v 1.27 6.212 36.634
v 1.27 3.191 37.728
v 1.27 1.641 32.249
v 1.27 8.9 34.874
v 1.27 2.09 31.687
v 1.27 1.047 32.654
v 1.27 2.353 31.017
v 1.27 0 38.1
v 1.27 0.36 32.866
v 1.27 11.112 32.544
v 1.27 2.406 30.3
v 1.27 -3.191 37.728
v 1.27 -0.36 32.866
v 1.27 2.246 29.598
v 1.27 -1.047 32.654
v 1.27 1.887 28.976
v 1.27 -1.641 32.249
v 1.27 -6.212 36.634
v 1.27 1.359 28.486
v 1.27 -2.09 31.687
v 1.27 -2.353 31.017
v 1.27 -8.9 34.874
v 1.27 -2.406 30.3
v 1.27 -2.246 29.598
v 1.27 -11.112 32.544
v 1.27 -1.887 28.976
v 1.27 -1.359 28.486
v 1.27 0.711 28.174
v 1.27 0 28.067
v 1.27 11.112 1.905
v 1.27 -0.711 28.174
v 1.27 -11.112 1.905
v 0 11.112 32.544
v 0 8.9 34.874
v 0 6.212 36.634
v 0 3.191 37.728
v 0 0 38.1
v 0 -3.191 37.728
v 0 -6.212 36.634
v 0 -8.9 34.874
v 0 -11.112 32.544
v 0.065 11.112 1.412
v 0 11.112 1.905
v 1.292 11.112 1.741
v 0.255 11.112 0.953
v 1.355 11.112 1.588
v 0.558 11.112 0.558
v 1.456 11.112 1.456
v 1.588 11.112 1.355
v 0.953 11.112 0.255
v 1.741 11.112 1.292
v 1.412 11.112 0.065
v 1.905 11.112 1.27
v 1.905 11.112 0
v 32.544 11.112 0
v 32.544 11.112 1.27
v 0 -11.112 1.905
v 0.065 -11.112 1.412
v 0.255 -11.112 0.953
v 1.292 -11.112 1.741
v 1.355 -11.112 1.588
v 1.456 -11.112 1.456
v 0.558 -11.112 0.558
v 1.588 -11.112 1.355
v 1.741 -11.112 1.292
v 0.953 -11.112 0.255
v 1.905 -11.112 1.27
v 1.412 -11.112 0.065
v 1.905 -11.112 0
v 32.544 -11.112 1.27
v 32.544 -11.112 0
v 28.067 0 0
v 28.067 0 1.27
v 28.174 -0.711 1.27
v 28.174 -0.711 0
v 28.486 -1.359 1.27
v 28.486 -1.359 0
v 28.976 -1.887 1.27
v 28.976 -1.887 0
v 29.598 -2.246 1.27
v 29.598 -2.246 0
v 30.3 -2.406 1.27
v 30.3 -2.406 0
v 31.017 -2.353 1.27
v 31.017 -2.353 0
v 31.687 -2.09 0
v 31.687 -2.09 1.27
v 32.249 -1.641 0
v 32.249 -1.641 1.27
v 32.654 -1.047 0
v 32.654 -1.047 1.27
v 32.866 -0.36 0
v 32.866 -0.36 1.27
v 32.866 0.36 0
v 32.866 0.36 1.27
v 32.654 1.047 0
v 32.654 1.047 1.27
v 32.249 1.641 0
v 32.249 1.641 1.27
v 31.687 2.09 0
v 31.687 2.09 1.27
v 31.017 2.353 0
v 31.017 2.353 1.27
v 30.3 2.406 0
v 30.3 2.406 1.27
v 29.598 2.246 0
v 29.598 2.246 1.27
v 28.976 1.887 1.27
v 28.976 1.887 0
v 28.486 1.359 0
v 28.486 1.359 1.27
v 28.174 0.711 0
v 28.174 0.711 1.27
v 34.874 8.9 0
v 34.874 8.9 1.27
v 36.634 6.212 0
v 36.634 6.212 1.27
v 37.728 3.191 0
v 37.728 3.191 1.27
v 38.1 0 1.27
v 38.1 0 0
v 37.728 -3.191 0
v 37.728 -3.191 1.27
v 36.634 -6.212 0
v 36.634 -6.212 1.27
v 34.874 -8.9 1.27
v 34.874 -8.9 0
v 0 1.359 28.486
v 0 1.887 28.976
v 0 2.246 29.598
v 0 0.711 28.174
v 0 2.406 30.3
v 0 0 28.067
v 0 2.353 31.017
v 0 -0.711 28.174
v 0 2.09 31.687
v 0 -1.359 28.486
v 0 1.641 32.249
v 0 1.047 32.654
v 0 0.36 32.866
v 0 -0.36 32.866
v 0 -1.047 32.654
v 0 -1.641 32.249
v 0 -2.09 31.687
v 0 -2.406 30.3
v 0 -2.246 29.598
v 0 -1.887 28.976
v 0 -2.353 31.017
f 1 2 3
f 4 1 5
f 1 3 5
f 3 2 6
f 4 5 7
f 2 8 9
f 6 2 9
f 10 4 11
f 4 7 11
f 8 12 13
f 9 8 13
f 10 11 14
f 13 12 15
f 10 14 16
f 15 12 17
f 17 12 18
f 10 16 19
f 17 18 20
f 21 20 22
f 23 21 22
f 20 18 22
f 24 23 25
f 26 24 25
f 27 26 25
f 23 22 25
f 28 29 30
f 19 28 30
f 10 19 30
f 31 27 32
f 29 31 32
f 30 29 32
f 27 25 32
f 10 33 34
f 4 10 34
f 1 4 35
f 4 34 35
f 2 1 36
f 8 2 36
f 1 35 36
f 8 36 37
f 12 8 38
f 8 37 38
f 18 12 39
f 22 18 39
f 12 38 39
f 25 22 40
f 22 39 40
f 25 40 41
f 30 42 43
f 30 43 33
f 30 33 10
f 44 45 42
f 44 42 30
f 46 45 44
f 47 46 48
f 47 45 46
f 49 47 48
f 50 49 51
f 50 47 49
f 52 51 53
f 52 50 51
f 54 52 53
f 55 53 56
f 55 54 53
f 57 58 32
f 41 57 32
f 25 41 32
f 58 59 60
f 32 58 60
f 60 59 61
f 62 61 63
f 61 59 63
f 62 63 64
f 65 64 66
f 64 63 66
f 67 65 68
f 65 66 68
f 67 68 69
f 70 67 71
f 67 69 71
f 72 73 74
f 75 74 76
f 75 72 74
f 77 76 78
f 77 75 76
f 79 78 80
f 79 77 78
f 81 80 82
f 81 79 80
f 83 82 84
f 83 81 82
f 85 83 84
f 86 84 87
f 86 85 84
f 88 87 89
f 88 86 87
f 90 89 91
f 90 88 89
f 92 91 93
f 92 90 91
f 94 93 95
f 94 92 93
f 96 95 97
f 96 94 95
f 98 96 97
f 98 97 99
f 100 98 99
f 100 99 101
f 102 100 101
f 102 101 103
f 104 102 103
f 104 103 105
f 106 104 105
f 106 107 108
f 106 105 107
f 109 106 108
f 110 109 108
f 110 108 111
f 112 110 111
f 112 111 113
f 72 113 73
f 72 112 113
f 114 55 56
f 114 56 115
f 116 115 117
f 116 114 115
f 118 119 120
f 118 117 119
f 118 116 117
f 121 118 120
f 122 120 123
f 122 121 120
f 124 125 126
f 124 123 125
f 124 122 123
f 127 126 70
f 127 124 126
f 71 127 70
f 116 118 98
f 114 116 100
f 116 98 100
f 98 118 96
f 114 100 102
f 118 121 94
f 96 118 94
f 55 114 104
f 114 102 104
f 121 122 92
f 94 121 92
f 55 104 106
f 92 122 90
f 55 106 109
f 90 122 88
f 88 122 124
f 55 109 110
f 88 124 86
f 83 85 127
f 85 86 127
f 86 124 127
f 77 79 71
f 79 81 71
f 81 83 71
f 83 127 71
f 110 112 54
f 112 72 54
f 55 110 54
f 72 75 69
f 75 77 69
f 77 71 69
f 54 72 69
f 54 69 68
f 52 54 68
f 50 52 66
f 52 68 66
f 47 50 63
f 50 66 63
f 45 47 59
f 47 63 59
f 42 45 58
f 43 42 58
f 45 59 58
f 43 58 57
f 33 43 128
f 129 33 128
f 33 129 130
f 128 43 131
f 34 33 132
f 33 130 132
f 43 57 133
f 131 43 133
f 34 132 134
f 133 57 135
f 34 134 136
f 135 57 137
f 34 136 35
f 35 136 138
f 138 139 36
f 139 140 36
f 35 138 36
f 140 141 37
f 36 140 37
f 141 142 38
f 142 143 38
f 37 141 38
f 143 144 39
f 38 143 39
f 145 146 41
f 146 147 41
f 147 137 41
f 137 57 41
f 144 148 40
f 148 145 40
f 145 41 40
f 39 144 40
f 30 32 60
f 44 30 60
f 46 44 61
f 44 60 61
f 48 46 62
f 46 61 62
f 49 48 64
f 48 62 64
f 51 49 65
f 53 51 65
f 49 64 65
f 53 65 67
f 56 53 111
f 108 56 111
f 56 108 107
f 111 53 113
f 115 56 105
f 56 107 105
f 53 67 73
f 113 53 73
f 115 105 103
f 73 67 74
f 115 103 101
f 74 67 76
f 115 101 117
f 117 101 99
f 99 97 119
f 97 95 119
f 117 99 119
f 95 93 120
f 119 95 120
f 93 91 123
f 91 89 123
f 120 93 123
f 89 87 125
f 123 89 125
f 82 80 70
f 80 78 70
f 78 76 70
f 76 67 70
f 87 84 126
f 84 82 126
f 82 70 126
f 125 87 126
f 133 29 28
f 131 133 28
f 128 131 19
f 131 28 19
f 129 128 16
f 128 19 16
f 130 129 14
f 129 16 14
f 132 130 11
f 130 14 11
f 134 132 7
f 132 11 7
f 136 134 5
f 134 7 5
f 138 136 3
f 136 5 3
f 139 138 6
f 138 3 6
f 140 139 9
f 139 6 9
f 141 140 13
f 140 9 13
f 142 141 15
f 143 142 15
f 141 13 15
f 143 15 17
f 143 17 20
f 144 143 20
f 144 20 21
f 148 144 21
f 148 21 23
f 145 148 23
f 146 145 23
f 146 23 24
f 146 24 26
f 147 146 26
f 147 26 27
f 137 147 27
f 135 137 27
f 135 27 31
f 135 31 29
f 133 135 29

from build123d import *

# Parameters (mm, degrees)
EXTRUDE_THIN1_START     = -11.1125
EXTRUDE_THIN1_DEPTH     = 22.225
SKETCH4_R               = 2.413
EXTRUDE3_DEPTH          = 55.143758239
SKETCH6_R               = 2.413
CUT_EXTRUDE1_DEPTH      = 56.015521957
CUT_EXTRUDE2_DEPTH      = 55.143758239
CUT_EXTRUDE2_DEPTH_BACK = 55.143758239
CUT_EXTRUDE3_DEPTH      = 56.015521957
CUT_EXTRUDE3_DEPTH_BACK = 56.015521957


# Read off the part's stored shape, not the designer's step: Extrude-Thin1
with BuildPart() as part:
    # Extrude-Thin1 outline → Extrude-Thin1 (new body)
    with BuildSketch(Plane(origin=(0, 0, 0), x_dir=(1, 0, 0), z_dir=(0, 1, 0)).offset(EXTRUDE_THIN1_START)):
        with BuildLine():
            Line((1.905, -1.27), (38.1, -1.27))
            Line((38.1, -1.27), (38.1, 0))
            Line((38.1, 0), (1.905, 0))
            ThreePointArc((1.905, 0), (0.557961582, -0.557961582), (0, -1.905))
            Line((0, -1.905), (0, -38.1))
            Line((0, -38.1), (1.27, -38.1))
            Line((1.27, -38.1), (1.27, -1.905))
            ThreePointArc((1.27, -1.905), (1.455987194, -1.455987194), (1.905, -1.27))
        make_face()
    extrude(amount=EXTRUDE_THIN1_DEPTH)

    # Sketch4 → Extrude3 (cut, through all)
    with BuildSketch(Plane(origin=(1.27, 0, 0), x_dir=(0, 0, -1), z_dir=(1, 0, 0))):
        with Locations((-30.48, 0)):
            Circle(SKETCH4_R)
    extrude(amount=-EXTRUDE3_DEPTH, mode=Mode.SUBTRACT)

    # Sketch6 → Cut-Extrude1 (cut, through all)
    with BuildSketch(Plane.XY):
        with Locations(Location((30.48, 0, 0), (0, 0, 180))):
            Circle(SKETCH6_R)
    extrude(amount=CUT_EXTRUDE1_DEPTH, mode=Mode.SUBTRACT)

    # Sketch8 → Cut-Extrude2 (cut, two sides: drawn at the far end of the back side and taken through both)
    with BuildSketch(Plane(origin=(1.27, 0, 0), x_dir=(0, 0, -1), z_dir=(1, 0, 0)).offset(-CUT_EXTRUDE2_DEPTH_BACK)):
        with BuildLine():
            Line((38.510183264, 64.402949948), (-32.54375, 11.1125))
            ThreePointArc((-32.54375, 11.1125), (-38.1, 0), (-32.54375, -11.1125))
            Line((-32.54375, -11.1125), (38.510183264, -64.402949948))
            Line((38.510183264, -64.402949948), (-139.124649895, -64.402949948))
            Line((-139.124649895, -64.402949948), (-139.124649895, 64.402949948))
            Line((-139.124649895, 64.402949948), (38.510183264, 64.402949948))
        make_face()
    extrude(amount=CUT_EXTRUDE2_DEPTH + CUT_EXTRUDE2_DEPTH_BACK, mode=Mode.SUBTRACT)

    # Sketch9 → Cut-Extrude3 (cut, two sides: drawn at the far end of the back side and taken through both)
    with BuildSketch(Plane.XY.offset(-CUT_EXTRUDE3_DEPTH_BACK)):
        with BuildLine():
            Line((-38.510183264, 64.402949948), (32.54375, 11.1125))
            ThreePointArc((32.54375, 11.1125), (38.1, 0), (32.54375, -11.1125))
            Line((32.54375, -11.1125), (-38.510183264, -64.402949948))
            Line((-38.510183264, -64.402949948), (139.124649895, -64.402949948))
            Line((139.124649895, -64.402949948), (139.124649895, 64.402949948))
            Line((139.124649895, 64.402949948), (-38.510183264, 64.402949948))
        make_face()
    extrude(amount=CUT_EXTRUDE3_DEPTH + CUT_EXTRUDE3_DEPTH_BACK, mode=Mode.SUBTRACT)


solid = part.part
